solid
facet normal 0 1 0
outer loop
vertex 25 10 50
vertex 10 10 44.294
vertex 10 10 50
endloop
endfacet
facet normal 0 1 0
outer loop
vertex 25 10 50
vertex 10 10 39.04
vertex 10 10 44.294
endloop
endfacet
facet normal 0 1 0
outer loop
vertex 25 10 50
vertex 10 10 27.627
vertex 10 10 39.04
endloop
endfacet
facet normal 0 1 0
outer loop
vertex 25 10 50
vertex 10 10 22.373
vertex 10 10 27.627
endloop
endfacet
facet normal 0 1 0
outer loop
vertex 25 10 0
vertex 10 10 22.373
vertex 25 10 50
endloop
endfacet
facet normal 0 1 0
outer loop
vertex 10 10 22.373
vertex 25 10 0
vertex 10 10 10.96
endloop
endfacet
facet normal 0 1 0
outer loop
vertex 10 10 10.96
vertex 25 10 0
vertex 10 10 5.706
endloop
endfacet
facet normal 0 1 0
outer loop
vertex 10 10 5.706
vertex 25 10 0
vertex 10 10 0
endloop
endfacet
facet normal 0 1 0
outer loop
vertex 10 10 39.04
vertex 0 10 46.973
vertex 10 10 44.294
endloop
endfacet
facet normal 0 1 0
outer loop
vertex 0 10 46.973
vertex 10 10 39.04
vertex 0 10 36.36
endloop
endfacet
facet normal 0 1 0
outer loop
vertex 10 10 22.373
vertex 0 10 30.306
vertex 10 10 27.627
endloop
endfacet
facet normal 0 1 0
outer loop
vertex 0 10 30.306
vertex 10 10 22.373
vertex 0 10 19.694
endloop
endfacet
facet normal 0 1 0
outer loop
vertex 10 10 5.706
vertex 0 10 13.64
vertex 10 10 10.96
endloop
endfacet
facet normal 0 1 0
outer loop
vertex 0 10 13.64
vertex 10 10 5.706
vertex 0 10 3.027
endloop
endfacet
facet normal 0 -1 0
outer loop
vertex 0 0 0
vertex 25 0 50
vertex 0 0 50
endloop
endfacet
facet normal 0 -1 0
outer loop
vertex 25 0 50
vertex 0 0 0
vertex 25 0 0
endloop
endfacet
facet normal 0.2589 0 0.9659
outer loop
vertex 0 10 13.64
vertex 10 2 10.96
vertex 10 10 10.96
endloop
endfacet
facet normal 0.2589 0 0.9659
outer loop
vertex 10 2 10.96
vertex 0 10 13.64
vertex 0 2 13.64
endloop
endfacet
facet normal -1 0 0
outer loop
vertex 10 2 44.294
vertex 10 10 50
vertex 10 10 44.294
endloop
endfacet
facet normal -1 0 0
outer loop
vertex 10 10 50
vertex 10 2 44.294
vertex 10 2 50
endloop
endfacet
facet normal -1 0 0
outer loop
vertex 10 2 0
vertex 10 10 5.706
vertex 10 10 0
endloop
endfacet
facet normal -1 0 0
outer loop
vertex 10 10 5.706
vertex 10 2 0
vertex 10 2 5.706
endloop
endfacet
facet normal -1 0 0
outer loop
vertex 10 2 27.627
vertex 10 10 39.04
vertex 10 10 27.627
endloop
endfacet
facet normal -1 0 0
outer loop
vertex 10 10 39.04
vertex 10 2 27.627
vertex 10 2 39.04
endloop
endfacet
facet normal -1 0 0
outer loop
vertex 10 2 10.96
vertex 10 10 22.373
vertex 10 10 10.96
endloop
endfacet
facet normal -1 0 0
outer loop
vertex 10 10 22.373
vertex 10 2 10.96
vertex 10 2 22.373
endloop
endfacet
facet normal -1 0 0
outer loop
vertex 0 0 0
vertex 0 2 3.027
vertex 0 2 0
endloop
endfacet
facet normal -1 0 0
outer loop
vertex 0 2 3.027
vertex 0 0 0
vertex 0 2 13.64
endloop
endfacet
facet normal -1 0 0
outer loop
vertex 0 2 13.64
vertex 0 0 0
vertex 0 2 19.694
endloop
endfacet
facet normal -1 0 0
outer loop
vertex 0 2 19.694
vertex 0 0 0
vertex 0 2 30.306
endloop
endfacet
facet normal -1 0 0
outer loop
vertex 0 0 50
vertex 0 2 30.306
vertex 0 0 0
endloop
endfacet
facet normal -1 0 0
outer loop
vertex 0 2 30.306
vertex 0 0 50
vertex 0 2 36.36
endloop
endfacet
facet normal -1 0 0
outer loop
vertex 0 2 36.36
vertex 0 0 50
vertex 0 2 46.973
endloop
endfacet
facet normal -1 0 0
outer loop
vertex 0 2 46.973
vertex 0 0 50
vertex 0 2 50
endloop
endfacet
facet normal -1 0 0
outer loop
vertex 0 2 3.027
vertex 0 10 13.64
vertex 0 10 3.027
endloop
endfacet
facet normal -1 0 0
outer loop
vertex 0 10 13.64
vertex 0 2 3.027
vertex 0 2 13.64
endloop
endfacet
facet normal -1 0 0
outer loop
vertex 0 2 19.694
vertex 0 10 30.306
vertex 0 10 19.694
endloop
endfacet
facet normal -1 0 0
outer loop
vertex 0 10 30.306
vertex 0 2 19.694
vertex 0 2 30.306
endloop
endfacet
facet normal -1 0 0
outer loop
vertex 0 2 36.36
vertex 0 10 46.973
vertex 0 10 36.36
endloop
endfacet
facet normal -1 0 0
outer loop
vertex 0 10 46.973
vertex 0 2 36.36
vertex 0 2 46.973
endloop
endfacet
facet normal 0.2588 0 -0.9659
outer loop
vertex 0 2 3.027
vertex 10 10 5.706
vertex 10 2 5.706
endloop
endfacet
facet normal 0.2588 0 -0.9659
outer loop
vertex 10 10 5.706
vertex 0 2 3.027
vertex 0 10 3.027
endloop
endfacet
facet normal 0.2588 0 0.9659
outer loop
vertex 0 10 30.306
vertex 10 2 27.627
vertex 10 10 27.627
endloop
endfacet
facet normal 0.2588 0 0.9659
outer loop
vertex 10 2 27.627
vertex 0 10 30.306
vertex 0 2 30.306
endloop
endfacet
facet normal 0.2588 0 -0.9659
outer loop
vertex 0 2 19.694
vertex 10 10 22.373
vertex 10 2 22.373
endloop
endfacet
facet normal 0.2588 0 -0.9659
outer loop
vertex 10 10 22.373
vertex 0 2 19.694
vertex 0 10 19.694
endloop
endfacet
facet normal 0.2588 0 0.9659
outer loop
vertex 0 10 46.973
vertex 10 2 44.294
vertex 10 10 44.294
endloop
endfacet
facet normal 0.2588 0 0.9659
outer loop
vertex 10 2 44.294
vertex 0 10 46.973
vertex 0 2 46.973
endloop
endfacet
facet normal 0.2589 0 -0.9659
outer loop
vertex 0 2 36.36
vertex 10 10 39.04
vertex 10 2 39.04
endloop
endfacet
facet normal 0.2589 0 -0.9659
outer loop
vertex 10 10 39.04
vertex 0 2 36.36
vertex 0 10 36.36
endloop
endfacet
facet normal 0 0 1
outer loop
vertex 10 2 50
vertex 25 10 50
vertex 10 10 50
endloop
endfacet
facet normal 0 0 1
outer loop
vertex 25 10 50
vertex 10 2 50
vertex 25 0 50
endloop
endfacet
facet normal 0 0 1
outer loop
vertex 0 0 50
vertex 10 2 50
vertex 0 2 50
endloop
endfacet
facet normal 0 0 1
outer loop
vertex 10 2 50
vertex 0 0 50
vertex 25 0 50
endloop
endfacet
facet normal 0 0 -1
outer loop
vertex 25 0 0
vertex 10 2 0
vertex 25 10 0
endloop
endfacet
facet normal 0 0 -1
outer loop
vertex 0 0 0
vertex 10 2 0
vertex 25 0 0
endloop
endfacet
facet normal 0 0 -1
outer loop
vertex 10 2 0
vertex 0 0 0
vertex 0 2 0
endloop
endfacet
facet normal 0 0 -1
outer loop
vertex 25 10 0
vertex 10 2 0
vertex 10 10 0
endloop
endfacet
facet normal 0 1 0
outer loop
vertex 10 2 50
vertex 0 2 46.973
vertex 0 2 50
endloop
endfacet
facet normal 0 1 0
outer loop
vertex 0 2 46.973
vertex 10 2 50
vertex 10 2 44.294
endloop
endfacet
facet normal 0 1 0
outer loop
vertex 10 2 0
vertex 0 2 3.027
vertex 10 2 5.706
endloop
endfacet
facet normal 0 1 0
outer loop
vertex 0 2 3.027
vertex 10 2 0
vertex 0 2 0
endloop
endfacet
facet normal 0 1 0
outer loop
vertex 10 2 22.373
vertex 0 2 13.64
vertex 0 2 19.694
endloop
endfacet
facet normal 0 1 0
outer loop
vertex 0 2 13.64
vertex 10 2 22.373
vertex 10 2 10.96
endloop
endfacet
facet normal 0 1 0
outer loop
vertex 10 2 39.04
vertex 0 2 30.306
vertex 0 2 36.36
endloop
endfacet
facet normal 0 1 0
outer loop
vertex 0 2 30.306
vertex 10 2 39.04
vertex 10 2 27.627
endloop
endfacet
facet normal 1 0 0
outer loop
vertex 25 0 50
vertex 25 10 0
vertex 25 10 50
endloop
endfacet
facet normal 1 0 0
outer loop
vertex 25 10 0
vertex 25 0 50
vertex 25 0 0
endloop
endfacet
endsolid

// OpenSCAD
/**
    blind dovetail 
    
    http://www.craftsmanspace.com/knowledge/dovetail-woodworking-joints.html
*/

l = 25;
b = 10;
h = 50;

hiddenThickness  = 2;
tailLength = b; // vergissing mijnerzeids, moet gelijk zijn natuurlijk
margin     = 0.2; // marging between pins and tail
angle = 75;  // 90 degrees is no dovetail.
             // hardwood 8:1 = 83 degrees. Softwoord 6:1 = 80 degrees
minimumGap  =  5;  // minimum room between tails

//calculate the number of tails
tails = getTails();
gap = getGap(tails);
echo(tails=tails, gap=gap);

color("green") tailBoard();
//color("red")   pinBoard();


module tailBoard(hidden = true) {
    union() {
        translate([tailLength, 0, 0])
            cube([l - tailLength, b, h]);
        pins(false, true);
    } 
}

module pinBoard(hidden = true) {
    difference() {
        translate([b, 0, 0])
            rotate([0, 0, 90])
                cube([l,b,h]);
        pins(true, true);
    }
}


module pin(cutOut) {
    
    m = cutOut ? margin : -margin;
    w = tailLength;    // width of pin
    tX = 0;   // translate x
    
    x = tailLength / tan(angle);
    p1 = [-x - m, 0];
    p2 = [-m, tailLength];
    p3 = [gap + m, tailLength];
    p4 = [gap + x + m, 0];
    
    p=[p1, p2, p3, p4];
    translate([tX, b, gap / 2])
    rotate([0, 90, -90])
    linear_extrude(height = b)
    polygon(p);
}

module pins(cutOut, hidden = true) {
    
    start = tailHeight(gap) / 2;
    height = 2 * start;
    union() {
        for (i = [0:tails - 1]) {
            translate([0, 0, start + i*height])
            pin(cutOut);
        }
        if (hidden) {
            cube([tailLength,hiddenThickness,h]);
        }
    }
}

//!halfPin(true, true);
module halfPin(top, cutOut) {
    c = [b*2, b*2, b];
    t = top ? [-b/2,-b/2, 0] : [-b/2, -b/2, -b];
    tc = top ? [0, 0, h] : [0, 0, 0];
    echo(top=top,t=t);
    translate(tc)
    difference() {
        pin(cutOut);
        translate(t)
            #cube(c);
    }
    
}


function getTails() = floor(h / tailHeight(minimumGap));
function getGap(tails)   = angle == 90 
                                ? h/(2 * tails)
                                : h/(2 * tails) - tailLength / tan(angle);  
function tailHeight(gap) = angle == 90 
                                ? gap 
                                : 2 * (tailLength / tan(angle) + gap);
